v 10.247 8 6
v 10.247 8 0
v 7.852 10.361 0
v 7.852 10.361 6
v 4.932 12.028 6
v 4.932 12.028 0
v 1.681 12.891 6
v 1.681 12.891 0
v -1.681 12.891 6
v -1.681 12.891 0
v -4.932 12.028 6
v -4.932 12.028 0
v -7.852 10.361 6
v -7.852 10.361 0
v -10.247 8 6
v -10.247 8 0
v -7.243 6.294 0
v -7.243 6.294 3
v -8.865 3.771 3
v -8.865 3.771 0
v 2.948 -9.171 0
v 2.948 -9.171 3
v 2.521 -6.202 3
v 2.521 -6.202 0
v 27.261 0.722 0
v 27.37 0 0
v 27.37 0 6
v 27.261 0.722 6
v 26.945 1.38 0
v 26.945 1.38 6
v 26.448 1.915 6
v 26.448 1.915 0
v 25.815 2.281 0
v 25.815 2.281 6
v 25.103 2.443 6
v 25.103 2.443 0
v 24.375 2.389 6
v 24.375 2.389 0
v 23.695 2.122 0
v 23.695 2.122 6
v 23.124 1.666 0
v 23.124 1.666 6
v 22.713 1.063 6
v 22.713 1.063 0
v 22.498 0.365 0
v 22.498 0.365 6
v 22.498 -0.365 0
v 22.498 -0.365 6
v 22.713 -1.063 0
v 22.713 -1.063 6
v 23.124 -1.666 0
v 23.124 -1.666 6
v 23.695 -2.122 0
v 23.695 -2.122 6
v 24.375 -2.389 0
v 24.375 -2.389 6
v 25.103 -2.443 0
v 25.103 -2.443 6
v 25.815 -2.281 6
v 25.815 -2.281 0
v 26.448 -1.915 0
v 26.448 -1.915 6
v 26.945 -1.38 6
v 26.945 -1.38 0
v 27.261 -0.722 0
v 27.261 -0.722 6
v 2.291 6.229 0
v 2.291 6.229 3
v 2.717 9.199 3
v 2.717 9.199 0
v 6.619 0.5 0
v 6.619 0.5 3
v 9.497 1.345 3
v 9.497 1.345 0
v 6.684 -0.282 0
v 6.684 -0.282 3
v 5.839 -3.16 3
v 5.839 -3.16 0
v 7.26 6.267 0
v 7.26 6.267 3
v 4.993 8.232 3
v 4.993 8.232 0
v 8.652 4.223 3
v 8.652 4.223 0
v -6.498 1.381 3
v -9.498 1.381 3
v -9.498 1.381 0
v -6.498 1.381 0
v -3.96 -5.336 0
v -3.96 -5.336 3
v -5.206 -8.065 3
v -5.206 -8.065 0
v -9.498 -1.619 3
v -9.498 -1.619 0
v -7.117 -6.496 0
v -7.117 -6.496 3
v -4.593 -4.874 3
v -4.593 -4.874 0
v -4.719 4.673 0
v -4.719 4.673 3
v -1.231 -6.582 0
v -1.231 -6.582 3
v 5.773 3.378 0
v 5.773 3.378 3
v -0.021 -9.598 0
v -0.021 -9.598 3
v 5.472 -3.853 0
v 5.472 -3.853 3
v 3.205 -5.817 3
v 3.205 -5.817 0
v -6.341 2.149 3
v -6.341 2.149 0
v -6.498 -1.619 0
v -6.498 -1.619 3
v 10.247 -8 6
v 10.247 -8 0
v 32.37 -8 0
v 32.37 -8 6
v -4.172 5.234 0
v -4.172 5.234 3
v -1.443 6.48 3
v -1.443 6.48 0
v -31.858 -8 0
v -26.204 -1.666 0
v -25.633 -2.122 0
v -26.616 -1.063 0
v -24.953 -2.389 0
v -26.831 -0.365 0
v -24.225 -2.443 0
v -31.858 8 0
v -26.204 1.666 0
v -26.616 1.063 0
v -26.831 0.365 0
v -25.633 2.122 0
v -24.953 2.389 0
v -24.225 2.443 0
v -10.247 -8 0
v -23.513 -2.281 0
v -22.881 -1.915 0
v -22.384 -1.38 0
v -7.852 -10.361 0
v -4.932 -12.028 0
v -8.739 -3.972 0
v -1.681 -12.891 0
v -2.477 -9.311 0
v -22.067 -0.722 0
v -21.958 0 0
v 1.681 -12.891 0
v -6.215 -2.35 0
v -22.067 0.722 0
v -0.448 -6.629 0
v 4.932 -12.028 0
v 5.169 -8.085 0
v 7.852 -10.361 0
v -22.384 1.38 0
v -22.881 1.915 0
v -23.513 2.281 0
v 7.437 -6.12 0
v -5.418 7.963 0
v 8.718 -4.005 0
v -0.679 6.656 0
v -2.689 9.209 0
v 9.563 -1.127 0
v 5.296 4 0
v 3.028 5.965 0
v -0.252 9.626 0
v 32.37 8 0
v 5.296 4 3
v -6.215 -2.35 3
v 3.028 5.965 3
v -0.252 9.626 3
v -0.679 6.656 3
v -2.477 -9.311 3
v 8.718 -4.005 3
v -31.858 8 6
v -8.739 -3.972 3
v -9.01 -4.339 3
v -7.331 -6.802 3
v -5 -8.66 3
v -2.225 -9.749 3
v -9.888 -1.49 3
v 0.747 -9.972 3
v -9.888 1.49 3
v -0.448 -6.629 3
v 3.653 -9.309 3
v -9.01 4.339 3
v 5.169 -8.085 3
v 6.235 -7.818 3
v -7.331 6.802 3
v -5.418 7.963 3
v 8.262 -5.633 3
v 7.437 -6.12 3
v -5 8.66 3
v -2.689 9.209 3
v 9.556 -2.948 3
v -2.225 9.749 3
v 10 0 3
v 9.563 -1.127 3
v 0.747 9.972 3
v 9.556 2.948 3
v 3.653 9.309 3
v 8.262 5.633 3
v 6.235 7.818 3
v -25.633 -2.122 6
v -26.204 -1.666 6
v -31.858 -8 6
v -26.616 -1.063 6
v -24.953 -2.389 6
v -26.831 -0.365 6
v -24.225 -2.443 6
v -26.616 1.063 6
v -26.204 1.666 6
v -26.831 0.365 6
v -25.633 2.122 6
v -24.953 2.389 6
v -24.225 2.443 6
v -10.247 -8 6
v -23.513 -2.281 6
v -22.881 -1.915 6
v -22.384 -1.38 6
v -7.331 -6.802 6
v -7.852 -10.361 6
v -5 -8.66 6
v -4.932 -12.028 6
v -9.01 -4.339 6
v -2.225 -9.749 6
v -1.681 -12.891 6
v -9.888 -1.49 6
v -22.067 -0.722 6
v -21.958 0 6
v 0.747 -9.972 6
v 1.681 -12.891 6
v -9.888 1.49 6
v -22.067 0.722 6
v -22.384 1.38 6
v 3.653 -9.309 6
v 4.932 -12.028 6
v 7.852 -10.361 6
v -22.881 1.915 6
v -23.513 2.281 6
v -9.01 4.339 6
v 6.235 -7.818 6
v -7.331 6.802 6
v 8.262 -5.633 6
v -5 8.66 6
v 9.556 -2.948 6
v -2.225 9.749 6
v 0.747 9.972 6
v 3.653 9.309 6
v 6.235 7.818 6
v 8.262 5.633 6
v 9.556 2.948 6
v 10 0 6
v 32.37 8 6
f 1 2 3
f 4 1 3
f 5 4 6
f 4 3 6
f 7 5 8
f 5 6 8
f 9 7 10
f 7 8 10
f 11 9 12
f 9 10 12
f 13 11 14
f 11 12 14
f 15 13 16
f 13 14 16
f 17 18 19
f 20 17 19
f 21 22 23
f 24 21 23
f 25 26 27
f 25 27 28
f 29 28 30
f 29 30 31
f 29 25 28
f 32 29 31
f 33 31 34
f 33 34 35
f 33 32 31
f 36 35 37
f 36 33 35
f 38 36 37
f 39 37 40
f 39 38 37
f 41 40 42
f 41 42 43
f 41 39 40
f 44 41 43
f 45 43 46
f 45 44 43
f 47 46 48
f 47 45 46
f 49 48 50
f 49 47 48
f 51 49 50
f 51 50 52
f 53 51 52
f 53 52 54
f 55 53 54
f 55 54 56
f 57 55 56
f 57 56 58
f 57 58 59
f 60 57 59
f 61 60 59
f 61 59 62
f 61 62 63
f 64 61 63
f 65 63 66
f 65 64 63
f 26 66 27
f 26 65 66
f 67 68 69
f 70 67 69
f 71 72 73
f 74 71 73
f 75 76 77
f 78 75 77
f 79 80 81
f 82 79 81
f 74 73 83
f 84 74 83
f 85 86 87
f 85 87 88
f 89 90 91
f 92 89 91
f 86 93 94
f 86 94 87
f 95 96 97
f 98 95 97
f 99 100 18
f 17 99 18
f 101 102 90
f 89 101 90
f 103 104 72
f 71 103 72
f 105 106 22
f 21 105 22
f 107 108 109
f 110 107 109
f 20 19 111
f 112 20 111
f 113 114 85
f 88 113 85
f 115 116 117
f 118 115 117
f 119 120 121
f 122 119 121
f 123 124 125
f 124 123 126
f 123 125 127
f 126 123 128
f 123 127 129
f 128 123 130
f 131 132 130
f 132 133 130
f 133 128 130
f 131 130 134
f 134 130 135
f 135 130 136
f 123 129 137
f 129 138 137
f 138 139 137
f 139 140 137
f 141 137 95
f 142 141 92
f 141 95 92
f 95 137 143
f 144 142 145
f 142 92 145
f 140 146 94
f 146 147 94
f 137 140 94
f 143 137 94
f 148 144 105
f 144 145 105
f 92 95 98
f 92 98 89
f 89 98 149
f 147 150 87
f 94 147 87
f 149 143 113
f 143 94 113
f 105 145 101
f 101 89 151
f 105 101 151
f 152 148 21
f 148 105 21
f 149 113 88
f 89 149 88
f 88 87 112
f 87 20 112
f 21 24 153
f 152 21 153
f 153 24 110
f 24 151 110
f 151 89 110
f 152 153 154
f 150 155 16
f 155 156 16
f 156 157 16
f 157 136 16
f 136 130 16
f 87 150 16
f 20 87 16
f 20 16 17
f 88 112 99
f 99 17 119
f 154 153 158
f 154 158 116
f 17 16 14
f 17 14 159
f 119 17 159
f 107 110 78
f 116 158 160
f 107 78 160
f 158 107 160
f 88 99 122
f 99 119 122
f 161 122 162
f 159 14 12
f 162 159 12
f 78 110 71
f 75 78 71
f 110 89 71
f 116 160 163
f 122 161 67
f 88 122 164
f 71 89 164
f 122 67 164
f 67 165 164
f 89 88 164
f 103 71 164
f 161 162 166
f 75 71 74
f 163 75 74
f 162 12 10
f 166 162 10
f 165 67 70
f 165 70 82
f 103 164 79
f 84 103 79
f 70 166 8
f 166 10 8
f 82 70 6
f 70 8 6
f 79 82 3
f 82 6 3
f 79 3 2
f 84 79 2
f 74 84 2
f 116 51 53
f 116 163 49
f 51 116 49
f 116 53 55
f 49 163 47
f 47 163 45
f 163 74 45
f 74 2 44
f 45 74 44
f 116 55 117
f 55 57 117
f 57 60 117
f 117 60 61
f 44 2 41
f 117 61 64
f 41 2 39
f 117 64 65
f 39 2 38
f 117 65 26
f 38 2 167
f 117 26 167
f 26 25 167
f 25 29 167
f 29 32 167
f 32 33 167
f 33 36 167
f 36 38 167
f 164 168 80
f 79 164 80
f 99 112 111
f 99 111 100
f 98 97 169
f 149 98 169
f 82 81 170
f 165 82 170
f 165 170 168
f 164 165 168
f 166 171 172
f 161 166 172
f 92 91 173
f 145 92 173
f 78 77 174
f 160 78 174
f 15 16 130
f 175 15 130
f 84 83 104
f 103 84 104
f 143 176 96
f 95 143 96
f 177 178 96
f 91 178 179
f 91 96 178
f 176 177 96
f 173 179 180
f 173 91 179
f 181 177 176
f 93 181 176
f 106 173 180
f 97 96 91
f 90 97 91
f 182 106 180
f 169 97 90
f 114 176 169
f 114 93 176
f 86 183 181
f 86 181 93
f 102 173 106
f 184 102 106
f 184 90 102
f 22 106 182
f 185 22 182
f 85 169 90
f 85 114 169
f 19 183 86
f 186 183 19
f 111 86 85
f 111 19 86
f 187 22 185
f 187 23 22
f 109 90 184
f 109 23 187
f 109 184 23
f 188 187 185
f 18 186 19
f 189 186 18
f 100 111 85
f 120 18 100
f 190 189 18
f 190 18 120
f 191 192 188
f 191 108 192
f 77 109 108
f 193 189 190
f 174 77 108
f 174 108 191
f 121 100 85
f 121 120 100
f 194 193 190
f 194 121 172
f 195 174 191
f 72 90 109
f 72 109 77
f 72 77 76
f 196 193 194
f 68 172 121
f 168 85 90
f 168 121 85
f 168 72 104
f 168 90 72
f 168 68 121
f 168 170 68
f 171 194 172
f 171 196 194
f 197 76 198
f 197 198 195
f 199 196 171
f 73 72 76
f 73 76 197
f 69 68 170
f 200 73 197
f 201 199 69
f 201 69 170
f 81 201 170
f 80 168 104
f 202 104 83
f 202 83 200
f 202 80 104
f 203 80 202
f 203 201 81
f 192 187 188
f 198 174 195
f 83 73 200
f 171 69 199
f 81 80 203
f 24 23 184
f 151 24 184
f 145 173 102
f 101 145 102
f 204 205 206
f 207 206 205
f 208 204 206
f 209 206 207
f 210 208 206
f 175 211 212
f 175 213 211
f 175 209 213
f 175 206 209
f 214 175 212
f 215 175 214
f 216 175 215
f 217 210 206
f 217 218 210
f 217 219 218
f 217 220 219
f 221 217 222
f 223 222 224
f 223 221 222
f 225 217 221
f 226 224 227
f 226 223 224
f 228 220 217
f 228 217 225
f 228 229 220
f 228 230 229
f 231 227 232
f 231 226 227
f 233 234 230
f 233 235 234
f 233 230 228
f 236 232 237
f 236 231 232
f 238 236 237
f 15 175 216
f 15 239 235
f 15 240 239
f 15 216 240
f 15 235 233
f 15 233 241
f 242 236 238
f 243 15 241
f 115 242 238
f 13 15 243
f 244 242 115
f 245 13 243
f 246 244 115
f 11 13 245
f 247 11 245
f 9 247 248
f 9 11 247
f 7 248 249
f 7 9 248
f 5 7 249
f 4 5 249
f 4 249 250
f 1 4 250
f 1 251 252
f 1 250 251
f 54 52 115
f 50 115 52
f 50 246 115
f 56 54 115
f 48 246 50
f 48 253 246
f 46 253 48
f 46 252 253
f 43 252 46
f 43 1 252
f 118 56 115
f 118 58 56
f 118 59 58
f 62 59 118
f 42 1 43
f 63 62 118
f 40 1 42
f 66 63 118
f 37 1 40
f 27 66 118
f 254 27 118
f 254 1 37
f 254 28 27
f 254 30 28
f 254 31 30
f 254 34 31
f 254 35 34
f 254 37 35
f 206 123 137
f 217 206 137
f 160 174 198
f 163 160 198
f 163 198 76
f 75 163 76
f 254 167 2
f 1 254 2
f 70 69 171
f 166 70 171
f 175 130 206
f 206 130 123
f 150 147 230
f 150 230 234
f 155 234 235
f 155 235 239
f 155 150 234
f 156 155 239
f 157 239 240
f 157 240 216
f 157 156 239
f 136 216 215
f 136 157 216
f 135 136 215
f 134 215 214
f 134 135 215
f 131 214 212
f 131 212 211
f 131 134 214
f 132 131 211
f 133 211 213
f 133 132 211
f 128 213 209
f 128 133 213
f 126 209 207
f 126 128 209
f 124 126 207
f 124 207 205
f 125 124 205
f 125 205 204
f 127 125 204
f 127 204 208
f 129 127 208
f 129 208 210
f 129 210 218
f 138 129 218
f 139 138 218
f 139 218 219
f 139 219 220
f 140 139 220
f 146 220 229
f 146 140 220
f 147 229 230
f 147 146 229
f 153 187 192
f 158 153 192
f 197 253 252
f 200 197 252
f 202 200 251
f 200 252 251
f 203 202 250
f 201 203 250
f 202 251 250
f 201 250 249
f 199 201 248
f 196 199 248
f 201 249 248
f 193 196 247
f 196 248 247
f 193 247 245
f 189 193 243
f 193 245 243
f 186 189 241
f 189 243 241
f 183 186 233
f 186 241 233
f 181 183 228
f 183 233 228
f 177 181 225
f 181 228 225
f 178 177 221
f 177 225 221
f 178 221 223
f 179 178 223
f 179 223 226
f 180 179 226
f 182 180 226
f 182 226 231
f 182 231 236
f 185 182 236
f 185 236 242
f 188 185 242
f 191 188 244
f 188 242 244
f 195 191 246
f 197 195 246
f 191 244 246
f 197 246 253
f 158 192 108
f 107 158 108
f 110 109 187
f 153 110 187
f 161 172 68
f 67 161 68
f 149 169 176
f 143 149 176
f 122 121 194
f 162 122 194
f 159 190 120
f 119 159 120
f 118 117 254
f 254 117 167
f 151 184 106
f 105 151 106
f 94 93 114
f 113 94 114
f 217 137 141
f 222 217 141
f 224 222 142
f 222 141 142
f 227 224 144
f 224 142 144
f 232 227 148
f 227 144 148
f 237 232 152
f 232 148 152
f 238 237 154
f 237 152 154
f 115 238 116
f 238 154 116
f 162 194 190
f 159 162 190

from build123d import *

# Parameters (mm, degrees)
F0_R     = 2.45
F1_DEPTH = 6
F2_R     = 10
F3_DEPTH = 3
F4_W     = 3
F4_H     = 3
F5_DEPTH = 3.001


with BuildPart() as f1:
    # F0 (on Top) → F1 (new body)
    with BuildSketch(Plane.XY):
        with BuildLine():
            ThreePointArc((10.246951, -8), (12.292485, -4.230227), (13, 0))
            ThreePointArc((13, 0), (12.292485, 4.230227), (10.246951, 8))
            ThreePointArc((10.246951, 8), (0, 13), (-10.246951, 8))
            ThreePointArc((-10.246951, 8), (-13, 0), (-10.246951, -8))
            ThreePointArc((-10.246951, -8), (0, -13), (10.246951, -8))
        make_face()
        with BuildLine():
            ThreePointArc((10.246951, 8), (12.292485, 4.230227), (13, 0))
            ThreePointArc((13, 0), (12.292485, -4.230227), (10.246951, -8))
            Line((10.246951, -8), (32.370236, -8))
            Line((32.370236, -8), (32.370236, 8))
            Line((32.370236, 8), (10.246951, 8))
        make_face()
        with Locations((24.920236, 0)):
            Circle(F0_R, mode=Mode.SUBTRACT)
        with BuildLine():
            ThreePointArc((-10.246951, -8), (-13, 0), (-10.246951, 8))
            Line((-10.246951, 8), (-31.858318, 8))
            Line((-31.858318, 8), (-31.858318, -8))
            Line((-31.858318, -8), (-10.246951, -8))
        make_face()
        with Locations((-24.408318, 0)):
            Circle(F0_R, mode=Mode.SUBTRACT)
    extrude(amount=F1_DEPTH)

    # F2 (on face) → F3 (cut)
    with BuildSketch(Plane.XY.offset(6)):
        Circle(F2_R)
    extrude(amount=-F3_DEPTH, mode=Mode.SUBTRACT)

    # F4 (on face) → F5 (cut, through all)
    with BuildSketch(Plane.XY.offset(3)):
        with Locations((-7.998256, -0.119366)):
            Rectangle(F4_W, F4_H)
        Polygon((-4.593181, -4.874256), (-6.215104, -2.350495), (-8.738864, -3.972418), (-7.116942, -6.496178), align=None)
        Polygon((-1.230803, -6.582482), (-3.959699, -5.336237), (-5.205944, -8.065133), (-2.477048, -9.311378), align=None)
        Polygon((2.521346, -6.201695), (-0.448119, -6.62864), (-0.021174, -9.598104), (2.94829, -9.17116), align=None)
        Polygon((5.471985, -3.852792), (3.204737, -5.817374), (5.169319, -8.084623), (7.436567, -6.120041), align=None)
        Polygon((6.684308, -0.281532), (5.839111, -3.160011), (8.717589, -4.005209), (9.562787, -1.12673), align=None)
        Polygon((5.77341, 3.378234), (6.618608, 0.499755), (9.497087, 1.344952), (8.651889, 4.223431), align=None)
        Polygon((3.028496, 5.964556), (5.295744, 3.999974), (7.260327, 6.267223), (4.993078, 8.231805), align=None)
        Polygon((-0.678945, 6.656296), (2.290519, 6.229352), (2.717464, 9.198816), (-0.252001, 9.625761), align=None)
        Polygon((-4.171826, 5.233831), (-1.44293, 6.480076), (-2.689175, 9.208972), (-5.418071, 7.962727), align=None)
        Polygon((-6.341181, 2.148784), (-4.719259, 4.672544), (-7.243019, 6.294467), (-8.864942, 3.770706), align=None)
    extrude(amount=-F5_DEPTH, mode=Mode.SUBTRACT)


solid = f1.part
